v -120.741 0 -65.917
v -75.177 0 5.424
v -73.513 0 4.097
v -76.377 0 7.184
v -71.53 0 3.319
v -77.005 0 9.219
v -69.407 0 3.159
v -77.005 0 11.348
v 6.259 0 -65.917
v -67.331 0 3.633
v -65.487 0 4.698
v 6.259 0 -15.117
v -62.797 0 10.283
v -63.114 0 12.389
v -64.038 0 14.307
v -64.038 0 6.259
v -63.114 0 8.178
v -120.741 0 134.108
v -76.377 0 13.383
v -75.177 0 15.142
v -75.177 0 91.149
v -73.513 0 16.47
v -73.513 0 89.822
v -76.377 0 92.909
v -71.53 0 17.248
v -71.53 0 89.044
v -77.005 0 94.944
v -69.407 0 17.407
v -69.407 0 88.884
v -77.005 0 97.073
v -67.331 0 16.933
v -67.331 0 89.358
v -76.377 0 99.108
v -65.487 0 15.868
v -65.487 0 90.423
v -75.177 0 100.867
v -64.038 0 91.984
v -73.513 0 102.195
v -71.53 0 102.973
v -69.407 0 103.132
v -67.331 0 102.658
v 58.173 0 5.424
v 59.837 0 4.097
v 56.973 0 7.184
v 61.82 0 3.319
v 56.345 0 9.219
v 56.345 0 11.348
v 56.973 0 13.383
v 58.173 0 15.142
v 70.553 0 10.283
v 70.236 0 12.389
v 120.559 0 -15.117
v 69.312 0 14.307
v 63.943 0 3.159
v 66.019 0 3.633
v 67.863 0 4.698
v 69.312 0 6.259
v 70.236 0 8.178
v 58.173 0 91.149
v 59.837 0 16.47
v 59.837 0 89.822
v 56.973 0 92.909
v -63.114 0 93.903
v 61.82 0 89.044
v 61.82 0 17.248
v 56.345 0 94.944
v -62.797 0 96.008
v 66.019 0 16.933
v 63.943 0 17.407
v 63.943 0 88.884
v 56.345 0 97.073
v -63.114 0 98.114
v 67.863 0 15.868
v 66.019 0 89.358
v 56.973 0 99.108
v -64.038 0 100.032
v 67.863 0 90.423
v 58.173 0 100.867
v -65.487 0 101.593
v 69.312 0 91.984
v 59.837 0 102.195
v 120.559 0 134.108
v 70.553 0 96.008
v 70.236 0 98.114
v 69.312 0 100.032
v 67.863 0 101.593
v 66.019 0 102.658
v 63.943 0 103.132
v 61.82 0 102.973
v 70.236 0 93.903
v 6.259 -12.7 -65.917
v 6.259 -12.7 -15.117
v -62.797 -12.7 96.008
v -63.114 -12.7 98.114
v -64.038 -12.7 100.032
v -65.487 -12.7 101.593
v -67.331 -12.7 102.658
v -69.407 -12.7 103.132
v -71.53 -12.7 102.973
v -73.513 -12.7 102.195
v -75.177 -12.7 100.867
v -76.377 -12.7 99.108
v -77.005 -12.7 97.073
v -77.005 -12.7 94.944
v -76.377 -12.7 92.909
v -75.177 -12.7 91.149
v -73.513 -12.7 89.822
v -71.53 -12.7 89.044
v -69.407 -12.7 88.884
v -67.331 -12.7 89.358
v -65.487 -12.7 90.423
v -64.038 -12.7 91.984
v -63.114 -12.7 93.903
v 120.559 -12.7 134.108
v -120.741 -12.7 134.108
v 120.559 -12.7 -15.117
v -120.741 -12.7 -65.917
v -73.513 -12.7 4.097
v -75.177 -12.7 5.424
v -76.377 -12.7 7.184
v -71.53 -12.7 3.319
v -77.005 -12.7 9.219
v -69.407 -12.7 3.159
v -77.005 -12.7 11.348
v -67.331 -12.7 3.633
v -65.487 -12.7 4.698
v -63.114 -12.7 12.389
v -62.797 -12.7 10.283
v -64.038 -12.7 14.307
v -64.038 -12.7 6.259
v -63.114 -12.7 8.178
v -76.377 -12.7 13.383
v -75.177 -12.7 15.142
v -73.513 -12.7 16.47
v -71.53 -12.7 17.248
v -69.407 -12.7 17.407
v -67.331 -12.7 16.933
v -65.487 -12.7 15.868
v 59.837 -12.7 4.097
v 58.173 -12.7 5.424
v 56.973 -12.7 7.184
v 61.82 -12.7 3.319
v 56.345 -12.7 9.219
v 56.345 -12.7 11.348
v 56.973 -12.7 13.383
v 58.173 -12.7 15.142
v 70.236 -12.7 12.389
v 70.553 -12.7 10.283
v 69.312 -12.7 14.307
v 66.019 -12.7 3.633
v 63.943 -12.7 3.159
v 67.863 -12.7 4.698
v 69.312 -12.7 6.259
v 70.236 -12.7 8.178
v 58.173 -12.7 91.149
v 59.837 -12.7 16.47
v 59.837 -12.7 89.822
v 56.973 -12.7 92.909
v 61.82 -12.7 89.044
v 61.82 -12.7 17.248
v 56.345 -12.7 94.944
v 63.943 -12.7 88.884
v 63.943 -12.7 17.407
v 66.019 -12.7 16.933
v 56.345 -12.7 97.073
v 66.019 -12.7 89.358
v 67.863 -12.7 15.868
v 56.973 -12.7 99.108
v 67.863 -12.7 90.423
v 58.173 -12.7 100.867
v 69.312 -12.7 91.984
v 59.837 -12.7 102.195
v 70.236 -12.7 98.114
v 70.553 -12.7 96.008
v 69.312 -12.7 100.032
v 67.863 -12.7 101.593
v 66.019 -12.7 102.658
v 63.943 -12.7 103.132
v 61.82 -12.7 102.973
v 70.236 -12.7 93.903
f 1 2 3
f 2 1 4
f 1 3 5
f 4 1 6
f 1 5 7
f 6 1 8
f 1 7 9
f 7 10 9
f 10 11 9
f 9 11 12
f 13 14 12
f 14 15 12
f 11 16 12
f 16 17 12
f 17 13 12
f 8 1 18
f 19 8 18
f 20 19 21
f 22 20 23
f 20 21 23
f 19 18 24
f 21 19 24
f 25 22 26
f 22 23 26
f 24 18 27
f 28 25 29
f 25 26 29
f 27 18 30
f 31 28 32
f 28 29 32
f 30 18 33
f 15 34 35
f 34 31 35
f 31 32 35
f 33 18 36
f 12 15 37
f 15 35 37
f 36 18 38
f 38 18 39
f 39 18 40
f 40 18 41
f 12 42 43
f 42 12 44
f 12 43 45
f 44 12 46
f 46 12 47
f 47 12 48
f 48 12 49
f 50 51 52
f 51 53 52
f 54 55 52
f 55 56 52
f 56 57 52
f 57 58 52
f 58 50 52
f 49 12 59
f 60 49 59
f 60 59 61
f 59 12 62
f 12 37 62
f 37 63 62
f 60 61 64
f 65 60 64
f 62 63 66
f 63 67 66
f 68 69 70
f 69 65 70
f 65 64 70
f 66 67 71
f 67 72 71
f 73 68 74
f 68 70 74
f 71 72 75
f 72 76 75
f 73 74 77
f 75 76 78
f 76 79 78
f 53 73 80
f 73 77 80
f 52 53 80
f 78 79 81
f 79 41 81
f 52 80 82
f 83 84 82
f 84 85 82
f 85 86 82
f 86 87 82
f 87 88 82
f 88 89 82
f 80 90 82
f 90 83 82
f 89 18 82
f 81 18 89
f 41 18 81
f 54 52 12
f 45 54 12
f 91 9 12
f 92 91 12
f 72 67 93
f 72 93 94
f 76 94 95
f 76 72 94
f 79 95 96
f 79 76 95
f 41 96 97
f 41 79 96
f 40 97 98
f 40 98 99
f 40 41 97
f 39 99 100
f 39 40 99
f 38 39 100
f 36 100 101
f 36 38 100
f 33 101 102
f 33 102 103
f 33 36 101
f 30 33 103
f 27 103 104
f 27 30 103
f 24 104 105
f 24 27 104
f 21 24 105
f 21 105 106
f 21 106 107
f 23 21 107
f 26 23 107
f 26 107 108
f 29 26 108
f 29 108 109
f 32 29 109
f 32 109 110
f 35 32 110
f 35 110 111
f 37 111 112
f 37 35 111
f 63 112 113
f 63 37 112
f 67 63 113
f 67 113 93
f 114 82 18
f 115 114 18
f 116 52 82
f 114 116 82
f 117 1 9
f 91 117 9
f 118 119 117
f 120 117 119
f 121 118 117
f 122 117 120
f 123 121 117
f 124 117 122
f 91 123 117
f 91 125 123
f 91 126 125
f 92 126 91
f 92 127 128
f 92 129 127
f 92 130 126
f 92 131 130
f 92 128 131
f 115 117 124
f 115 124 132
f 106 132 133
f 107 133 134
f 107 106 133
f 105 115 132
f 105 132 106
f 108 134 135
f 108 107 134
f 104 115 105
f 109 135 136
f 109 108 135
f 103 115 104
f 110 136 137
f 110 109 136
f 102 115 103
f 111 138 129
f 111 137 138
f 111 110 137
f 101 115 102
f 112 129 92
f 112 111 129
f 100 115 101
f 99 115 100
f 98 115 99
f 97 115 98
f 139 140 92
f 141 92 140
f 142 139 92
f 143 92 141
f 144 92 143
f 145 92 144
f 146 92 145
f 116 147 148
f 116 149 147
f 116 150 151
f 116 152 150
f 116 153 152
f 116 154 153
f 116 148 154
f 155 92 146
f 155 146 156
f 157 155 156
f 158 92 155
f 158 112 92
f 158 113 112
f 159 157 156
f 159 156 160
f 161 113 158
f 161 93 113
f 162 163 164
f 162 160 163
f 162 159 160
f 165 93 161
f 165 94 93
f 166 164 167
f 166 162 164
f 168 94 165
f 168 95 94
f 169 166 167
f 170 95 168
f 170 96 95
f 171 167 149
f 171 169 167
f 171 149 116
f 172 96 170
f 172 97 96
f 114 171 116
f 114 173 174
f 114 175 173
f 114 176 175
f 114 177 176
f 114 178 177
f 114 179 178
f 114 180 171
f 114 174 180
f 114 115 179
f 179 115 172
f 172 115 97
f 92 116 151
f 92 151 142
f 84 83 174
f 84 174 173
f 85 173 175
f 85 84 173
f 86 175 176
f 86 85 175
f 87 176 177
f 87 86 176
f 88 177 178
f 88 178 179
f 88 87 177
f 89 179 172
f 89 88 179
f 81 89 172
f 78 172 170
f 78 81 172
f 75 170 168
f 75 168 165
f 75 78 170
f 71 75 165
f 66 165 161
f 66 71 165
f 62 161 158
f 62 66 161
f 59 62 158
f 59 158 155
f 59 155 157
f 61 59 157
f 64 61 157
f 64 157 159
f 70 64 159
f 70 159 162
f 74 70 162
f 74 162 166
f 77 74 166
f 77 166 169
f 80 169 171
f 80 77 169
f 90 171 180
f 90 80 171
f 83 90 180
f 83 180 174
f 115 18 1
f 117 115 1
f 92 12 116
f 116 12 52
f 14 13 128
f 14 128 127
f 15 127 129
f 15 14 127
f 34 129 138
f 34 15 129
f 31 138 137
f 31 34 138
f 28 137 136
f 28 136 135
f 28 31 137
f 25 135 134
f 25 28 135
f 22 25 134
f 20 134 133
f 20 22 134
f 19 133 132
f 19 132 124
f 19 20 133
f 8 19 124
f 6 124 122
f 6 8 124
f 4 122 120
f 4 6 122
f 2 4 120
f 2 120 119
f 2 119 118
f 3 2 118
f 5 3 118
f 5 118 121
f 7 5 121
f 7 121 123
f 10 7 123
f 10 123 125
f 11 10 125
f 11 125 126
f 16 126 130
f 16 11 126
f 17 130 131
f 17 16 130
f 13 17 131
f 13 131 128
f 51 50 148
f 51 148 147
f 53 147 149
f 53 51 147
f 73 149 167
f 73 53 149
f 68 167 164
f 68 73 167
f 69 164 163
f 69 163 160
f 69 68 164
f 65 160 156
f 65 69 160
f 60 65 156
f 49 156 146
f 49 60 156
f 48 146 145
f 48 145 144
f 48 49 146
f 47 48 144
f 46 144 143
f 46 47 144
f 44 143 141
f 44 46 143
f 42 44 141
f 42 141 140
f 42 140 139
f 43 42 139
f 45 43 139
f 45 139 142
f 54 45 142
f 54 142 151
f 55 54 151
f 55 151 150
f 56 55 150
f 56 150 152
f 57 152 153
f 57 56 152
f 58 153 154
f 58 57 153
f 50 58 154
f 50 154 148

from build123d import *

# Parameters (mm, degrees)
F0_R     = 7.14375
F1_DEPTH = 12.7


with BuildPart() as f1:
    # F0 (on Front) → F1 (new body)
    with BuildSketch(Plane.XZ):
        Polygon((120.559285, 134.108239), (-120.740715, 134.108239), (-120.740715, -65.916761), (6.259285, -65.916761), (6.259285, -15.116761), (120.559285, -15.116761), align=None)
        with Locations((-69.940715, 10.283239)):
            Circle(F0_R, mode=Mode.SUBTRACT)
        with Locations((63.409285, 10.283239)):
            Circle(F0_R, mode=Mode.SUBTRACT)
        with Locations((-69.940715, 96.008239)):
            Circle(F0_R, mode=Mode.SUBTRACT)
        with Locations((63.409285, 96.008239)):
            Circle(F0_R, mode=Mode.SUBTRACT)
    extrude(amount=F1_DEPTH)


solid = f1.part
